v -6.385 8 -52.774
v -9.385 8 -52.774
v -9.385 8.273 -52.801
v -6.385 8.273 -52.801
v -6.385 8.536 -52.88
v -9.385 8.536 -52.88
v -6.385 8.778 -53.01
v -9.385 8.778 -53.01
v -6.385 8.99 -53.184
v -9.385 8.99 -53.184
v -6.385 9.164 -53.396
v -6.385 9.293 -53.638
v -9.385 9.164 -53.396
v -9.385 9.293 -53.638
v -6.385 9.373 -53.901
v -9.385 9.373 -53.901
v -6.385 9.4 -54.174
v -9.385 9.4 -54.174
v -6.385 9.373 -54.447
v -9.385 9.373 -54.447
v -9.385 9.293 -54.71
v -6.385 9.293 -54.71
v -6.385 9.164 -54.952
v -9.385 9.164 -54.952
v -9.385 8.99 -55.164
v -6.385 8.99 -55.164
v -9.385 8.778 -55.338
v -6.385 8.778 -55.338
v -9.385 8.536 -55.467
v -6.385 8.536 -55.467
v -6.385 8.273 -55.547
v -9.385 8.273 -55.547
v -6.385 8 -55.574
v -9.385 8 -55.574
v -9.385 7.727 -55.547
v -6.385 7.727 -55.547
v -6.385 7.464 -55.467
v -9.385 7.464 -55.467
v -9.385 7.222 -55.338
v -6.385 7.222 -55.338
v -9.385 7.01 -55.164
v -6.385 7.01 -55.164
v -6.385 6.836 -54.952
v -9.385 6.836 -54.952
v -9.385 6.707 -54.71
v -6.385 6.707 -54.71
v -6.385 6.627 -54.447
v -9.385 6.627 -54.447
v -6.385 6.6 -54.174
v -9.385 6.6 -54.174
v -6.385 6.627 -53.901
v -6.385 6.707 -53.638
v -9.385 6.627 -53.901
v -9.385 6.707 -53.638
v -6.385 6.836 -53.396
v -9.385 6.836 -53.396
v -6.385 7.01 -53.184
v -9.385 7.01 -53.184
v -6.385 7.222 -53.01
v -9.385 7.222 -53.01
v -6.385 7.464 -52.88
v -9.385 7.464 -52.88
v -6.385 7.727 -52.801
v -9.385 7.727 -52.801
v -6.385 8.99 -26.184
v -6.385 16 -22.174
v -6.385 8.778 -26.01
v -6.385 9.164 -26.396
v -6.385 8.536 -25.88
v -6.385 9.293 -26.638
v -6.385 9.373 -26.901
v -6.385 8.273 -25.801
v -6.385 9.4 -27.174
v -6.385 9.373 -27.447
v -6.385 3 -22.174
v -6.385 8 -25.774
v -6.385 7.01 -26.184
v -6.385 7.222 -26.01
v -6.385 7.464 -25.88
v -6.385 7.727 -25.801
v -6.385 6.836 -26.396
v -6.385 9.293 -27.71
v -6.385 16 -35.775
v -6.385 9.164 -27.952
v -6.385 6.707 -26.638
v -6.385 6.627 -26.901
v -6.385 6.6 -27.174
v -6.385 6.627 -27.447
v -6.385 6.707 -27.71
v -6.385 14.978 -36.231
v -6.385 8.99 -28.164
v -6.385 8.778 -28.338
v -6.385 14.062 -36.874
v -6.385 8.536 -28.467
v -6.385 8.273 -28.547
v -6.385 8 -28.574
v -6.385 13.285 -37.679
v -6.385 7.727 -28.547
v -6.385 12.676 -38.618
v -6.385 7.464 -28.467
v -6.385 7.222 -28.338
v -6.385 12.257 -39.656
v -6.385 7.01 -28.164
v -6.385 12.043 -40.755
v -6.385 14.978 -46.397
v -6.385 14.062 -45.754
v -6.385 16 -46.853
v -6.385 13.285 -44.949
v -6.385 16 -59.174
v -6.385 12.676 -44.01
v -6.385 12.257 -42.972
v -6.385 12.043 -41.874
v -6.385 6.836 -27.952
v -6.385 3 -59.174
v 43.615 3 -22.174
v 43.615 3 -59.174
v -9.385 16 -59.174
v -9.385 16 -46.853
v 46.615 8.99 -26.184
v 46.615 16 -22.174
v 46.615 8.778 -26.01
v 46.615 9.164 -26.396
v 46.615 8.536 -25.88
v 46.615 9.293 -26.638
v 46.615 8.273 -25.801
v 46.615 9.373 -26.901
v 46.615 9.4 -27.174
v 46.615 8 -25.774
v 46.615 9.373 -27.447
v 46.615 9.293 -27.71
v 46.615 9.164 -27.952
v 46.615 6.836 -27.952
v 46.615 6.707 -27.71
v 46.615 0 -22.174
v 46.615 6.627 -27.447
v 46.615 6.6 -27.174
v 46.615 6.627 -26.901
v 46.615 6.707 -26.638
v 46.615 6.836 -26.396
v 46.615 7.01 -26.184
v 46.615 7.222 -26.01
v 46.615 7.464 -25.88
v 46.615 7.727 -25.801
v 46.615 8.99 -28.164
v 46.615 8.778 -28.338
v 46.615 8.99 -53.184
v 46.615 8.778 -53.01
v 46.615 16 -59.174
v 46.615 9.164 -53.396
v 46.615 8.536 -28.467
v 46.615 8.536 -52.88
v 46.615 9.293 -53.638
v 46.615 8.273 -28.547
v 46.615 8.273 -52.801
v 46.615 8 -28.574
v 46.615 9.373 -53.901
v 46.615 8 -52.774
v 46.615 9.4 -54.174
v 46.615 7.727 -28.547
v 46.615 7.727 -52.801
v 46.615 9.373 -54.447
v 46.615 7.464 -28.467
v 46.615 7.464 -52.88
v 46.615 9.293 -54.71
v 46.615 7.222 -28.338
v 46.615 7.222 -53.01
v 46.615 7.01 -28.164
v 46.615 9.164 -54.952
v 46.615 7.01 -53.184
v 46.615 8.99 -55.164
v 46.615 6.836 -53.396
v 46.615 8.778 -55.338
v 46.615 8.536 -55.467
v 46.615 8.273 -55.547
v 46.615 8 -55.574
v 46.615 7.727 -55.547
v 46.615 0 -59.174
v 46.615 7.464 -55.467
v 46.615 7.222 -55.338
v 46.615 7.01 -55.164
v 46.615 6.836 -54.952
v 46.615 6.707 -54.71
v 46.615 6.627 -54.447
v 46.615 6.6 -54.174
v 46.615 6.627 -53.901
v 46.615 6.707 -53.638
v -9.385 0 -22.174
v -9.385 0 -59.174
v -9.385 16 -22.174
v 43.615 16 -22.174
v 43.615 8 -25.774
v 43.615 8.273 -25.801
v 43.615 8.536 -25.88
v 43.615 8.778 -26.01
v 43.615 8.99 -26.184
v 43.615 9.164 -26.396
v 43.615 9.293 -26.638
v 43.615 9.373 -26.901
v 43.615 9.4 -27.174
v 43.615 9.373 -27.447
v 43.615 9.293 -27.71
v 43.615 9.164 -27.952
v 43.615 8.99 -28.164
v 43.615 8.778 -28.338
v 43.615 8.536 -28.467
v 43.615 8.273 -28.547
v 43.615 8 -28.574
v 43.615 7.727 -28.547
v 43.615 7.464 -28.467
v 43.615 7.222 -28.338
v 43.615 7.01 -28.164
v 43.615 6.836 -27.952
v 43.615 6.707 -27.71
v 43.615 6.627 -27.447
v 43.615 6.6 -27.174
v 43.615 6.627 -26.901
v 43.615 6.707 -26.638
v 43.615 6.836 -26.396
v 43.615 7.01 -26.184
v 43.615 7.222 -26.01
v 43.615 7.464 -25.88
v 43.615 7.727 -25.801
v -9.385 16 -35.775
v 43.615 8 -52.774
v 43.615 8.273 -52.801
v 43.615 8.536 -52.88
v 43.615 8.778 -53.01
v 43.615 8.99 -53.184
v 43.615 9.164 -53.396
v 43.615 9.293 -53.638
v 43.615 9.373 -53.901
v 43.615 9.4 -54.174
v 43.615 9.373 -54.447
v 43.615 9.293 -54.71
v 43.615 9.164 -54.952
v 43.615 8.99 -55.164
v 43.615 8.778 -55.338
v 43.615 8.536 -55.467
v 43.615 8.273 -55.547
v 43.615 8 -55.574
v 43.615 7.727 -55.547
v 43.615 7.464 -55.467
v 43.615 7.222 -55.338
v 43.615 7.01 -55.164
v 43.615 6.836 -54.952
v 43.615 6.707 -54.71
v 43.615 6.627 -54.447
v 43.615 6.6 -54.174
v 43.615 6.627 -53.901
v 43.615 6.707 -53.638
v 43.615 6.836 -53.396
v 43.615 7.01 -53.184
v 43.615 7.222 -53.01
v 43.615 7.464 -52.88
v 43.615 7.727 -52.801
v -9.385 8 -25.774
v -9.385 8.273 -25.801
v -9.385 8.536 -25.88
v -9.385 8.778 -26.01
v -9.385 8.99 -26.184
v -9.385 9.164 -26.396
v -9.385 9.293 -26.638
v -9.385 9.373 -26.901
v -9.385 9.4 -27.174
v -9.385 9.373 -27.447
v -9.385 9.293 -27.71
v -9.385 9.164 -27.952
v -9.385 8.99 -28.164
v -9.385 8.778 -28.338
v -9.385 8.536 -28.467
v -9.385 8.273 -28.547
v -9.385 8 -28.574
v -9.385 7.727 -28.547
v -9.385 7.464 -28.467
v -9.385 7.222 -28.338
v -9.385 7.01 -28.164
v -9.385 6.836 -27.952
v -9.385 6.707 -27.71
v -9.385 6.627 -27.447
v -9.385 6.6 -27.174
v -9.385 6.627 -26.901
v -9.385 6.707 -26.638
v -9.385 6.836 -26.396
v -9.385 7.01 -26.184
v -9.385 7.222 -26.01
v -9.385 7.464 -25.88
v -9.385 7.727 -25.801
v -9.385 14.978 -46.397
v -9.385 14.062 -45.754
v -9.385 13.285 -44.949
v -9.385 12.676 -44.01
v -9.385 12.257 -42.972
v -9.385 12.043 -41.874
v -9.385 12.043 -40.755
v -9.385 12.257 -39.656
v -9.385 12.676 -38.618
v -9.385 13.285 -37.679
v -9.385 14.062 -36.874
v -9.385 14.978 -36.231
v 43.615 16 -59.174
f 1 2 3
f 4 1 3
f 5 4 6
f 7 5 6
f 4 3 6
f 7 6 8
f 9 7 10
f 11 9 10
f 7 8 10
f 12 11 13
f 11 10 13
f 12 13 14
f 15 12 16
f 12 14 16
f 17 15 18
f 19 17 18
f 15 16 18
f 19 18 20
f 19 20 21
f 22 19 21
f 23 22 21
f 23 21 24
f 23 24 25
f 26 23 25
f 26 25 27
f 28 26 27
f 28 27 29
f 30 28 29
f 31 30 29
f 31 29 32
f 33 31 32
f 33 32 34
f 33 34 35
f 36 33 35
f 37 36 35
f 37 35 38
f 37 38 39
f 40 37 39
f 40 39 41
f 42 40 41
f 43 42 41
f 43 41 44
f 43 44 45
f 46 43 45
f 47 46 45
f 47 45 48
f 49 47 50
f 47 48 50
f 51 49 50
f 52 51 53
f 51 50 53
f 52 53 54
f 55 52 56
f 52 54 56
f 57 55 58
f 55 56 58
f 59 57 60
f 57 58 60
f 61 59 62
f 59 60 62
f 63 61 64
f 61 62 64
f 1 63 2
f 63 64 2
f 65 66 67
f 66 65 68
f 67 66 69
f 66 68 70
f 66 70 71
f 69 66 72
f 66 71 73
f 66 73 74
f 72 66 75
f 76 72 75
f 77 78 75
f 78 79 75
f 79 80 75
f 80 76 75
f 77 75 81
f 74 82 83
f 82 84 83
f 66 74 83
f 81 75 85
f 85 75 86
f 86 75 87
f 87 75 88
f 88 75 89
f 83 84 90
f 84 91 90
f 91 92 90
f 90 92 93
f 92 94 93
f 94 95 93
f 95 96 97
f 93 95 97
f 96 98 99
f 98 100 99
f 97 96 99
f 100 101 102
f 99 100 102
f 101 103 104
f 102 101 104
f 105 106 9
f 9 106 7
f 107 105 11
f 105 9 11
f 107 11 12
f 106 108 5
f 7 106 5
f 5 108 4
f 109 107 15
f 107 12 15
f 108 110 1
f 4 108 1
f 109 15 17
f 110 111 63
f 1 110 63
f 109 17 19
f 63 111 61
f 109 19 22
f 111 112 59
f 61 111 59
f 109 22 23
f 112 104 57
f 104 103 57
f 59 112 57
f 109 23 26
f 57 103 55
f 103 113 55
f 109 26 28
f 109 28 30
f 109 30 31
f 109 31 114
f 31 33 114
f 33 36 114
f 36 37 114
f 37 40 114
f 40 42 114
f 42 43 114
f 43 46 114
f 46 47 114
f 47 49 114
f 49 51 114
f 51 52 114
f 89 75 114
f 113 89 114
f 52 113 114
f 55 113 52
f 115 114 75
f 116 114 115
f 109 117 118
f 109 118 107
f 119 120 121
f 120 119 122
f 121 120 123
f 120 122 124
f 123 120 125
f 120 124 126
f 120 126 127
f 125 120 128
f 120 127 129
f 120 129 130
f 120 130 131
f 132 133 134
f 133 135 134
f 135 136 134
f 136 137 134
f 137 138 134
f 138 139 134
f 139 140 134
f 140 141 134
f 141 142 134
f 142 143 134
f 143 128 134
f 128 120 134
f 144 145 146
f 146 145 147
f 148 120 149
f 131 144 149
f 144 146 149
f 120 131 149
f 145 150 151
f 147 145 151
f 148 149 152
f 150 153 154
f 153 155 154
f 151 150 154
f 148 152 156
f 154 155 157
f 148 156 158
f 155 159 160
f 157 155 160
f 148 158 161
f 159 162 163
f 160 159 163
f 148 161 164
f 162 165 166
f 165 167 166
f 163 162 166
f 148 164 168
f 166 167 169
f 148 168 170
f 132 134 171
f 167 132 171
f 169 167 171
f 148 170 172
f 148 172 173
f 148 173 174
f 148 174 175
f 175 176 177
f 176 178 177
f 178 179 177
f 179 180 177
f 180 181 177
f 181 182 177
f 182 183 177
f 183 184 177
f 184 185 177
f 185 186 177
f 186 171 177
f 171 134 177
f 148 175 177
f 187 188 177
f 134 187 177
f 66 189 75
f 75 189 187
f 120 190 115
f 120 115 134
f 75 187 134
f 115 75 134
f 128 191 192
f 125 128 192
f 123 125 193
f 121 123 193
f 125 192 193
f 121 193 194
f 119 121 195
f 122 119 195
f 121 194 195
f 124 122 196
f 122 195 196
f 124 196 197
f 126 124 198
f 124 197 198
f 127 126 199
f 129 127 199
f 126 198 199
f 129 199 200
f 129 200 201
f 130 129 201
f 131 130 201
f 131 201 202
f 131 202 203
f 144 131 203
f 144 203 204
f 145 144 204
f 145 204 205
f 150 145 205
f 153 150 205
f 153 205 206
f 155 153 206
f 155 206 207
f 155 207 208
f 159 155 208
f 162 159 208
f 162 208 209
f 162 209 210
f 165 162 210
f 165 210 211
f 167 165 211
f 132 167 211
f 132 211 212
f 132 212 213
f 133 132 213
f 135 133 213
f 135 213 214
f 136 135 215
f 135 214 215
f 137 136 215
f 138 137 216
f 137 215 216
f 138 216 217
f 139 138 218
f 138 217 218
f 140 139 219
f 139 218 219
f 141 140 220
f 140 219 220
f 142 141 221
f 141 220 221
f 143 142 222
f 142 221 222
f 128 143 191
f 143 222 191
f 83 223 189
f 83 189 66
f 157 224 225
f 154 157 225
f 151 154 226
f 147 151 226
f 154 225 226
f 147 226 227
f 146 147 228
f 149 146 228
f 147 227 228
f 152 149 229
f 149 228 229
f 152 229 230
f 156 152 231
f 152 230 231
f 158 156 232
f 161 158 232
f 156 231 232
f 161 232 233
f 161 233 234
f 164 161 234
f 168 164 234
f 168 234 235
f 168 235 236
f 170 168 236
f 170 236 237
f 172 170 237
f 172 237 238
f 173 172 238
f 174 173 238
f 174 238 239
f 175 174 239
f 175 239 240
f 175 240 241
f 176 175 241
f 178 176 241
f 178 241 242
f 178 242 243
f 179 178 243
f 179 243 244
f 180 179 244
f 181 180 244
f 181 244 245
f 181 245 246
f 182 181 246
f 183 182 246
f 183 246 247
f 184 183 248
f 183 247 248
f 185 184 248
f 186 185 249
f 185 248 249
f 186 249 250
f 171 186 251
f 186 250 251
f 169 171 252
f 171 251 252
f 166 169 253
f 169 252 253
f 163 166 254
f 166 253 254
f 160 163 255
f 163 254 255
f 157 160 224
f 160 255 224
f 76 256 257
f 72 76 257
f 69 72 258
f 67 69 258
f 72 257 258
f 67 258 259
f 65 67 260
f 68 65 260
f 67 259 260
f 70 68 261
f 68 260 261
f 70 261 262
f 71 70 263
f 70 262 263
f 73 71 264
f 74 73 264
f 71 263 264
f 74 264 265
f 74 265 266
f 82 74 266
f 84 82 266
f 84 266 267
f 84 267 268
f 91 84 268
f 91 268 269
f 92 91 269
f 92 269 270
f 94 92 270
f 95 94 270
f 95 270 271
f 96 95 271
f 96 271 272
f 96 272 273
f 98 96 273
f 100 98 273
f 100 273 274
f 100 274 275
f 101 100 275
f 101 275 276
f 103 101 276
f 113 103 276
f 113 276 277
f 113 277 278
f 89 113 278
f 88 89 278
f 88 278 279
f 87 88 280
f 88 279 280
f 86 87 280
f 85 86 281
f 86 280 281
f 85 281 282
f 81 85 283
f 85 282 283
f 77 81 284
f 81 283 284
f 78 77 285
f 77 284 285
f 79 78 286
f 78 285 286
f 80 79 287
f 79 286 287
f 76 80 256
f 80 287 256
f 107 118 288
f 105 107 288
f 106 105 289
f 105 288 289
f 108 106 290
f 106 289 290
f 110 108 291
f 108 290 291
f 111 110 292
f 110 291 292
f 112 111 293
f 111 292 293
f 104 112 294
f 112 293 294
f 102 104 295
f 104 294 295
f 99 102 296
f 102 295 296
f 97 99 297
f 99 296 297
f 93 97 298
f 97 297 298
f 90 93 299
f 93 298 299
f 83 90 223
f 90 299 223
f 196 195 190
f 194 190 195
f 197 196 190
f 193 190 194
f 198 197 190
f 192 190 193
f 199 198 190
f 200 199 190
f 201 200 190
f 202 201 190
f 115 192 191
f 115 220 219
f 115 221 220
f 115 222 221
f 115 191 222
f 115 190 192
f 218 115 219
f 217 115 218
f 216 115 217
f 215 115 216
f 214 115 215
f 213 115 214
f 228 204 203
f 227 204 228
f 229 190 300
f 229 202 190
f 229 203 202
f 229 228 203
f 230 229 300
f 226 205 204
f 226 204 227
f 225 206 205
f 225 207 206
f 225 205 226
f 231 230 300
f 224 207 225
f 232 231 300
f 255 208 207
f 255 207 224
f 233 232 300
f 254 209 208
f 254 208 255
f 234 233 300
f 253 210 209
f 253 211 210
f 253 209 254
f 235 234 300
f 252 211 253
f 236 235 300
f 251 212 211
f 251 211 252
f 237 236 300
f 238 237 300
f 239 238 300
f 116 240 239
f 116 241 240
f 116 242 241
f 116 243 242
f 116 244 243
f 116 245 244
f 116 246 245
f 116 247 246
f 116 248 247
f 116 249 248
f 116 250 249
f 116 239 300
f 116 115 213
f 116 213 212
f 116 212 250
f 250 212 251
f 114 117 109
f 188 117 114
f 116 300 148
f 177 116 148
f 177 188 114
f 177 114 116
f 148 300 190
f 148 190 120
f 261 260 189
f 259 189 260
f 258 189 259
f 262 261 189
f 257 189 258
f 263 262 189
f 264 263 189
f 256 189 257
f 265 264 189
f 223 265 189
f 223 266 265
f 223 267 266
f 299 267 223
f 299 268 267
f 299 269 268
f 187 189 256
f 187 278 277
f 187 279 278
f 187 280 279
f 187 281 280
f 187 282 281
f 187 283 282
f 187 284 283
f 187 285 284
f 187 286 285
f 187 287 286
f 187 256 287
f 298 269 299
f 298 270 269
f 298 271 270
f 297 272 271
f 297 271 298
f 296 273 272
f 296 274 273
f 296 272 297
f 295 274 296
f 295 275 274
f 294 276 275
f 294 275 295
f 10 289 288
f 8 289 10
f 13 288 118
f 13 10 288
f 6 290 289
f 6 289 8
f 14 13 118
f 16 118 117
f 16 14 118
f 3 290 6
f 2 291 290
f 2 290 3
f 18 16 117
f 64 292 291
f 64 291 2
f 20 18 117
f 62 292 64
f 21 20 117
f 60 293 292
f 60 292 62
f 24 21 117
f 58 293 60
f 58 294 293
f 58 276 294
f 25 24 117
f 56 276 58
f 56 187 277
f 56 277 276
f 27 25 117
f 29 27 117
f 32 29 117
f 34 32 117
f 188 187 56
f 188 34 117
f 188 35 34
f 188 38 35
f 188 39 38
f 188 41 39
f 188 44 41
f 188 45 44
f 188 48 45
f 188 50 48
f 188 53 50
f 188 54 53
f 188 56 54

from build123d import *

# Parameters (mm, degrees)
ESBO_O1_W                = 56
ESBO_O1_H                = 37
RESSALTO_EXTRUS_O1_DEPTH = 3
ESBO_O10_W               = 3
ESBO_O10_H               = 37
RESSALTO_EXTRUS_O2_DEPTH = 13
ESBO_O13_W               = 3
ESBO_O13_H               = 37
RESSALTO_EXTRUS_O3_DEPTH = 13
ESBO_O14_R               = 5.84268935
CORTE_EXTRUS_O1_DEPTH    = 30
ESBO_O15_R               = 1.4
CORTE_EXTRUS_O2_DEPTH    = 60
ESBO_O17_R               = 1.4
CORTE_EXTRUS_O3_DEPTH    = 60


with BuildPart() as part:
    # Esboço1 → Ressalto-extrusão1 (new body)
    with BuildSketch(Plane(origin=(0, 0, 0), x_dir=(1, 0, 0), z_dir=(0, 1, 0))):
        with Locations((18.614655485, 40.673930531)):
            Rectangle(ESBO_O1_W, ESBO_O1_H)
    extrude(amount=RESSALTO_EXTRUS_O1_DEPTH)

    # Esboço10 → Ressalto-extrusão2 (add)
    with BuildSketch(Plane(origin=(0, 3, 0), x_dir=(1, 0, 0), z_dir=(0, 1, 0))):
        with Locations((-7.885344515, 40.673930531)):
            Rectangle(ESBO_O10_W, ESBO_O10_H)
    extrude(amount=RESSALTO_EXTRUS_O2_DEPTH)

    # Esboço13 → Ressalto-extrusão3 (add)
    with BuildSketch(Plane(origin=(0, 3, 0), x_dir=(1, 0, 0), z_dir=(0, 1, 0))):
        with Locations((45.114655485, 40.673930531)):
            Rectangle(ESBO_O13_W, ESBO_O13_H)
    extrude(amount=RESSALTO_EXTRUS_O3_DEPTH)

    # Esboço14 → Corte-extrusão1 (cut)
    with BuildSketch(Plane.ZY.offset(9.385344515)):
        with Locations((-41.314070298, 17.859240249)):
            Circle(ESBO_O14_R)
    extrude(amount=-CORTE_EXTRUS_O1_DEPTH, mode=Mode.SUBTRACT)

    # Esboço15 → Corte-extrusão2 (cut)
    with BuildSketch(Plane.ZY.offset(9.385344515)):
        with Locations((-27.173930531, 8)):
            Circle(ESBO_O15_R)
    extrude(amount=-CORTE_EXTRUS_O2_DEPTH, mode=Mode.SUBTRACT)

    # Esboço17 → Corte-extrusão3 (cut)
    with BuildSketch(Plane.ZY.offset(9.385344515)):
        with Locations((-54.173930531, 8)):
            Circle(ESBO_O17_R)
    extrude(amount=-CORTE_EXTRUS_O3_DEPTH, mode=Mode.SUBTRACT)


solid = part.part
